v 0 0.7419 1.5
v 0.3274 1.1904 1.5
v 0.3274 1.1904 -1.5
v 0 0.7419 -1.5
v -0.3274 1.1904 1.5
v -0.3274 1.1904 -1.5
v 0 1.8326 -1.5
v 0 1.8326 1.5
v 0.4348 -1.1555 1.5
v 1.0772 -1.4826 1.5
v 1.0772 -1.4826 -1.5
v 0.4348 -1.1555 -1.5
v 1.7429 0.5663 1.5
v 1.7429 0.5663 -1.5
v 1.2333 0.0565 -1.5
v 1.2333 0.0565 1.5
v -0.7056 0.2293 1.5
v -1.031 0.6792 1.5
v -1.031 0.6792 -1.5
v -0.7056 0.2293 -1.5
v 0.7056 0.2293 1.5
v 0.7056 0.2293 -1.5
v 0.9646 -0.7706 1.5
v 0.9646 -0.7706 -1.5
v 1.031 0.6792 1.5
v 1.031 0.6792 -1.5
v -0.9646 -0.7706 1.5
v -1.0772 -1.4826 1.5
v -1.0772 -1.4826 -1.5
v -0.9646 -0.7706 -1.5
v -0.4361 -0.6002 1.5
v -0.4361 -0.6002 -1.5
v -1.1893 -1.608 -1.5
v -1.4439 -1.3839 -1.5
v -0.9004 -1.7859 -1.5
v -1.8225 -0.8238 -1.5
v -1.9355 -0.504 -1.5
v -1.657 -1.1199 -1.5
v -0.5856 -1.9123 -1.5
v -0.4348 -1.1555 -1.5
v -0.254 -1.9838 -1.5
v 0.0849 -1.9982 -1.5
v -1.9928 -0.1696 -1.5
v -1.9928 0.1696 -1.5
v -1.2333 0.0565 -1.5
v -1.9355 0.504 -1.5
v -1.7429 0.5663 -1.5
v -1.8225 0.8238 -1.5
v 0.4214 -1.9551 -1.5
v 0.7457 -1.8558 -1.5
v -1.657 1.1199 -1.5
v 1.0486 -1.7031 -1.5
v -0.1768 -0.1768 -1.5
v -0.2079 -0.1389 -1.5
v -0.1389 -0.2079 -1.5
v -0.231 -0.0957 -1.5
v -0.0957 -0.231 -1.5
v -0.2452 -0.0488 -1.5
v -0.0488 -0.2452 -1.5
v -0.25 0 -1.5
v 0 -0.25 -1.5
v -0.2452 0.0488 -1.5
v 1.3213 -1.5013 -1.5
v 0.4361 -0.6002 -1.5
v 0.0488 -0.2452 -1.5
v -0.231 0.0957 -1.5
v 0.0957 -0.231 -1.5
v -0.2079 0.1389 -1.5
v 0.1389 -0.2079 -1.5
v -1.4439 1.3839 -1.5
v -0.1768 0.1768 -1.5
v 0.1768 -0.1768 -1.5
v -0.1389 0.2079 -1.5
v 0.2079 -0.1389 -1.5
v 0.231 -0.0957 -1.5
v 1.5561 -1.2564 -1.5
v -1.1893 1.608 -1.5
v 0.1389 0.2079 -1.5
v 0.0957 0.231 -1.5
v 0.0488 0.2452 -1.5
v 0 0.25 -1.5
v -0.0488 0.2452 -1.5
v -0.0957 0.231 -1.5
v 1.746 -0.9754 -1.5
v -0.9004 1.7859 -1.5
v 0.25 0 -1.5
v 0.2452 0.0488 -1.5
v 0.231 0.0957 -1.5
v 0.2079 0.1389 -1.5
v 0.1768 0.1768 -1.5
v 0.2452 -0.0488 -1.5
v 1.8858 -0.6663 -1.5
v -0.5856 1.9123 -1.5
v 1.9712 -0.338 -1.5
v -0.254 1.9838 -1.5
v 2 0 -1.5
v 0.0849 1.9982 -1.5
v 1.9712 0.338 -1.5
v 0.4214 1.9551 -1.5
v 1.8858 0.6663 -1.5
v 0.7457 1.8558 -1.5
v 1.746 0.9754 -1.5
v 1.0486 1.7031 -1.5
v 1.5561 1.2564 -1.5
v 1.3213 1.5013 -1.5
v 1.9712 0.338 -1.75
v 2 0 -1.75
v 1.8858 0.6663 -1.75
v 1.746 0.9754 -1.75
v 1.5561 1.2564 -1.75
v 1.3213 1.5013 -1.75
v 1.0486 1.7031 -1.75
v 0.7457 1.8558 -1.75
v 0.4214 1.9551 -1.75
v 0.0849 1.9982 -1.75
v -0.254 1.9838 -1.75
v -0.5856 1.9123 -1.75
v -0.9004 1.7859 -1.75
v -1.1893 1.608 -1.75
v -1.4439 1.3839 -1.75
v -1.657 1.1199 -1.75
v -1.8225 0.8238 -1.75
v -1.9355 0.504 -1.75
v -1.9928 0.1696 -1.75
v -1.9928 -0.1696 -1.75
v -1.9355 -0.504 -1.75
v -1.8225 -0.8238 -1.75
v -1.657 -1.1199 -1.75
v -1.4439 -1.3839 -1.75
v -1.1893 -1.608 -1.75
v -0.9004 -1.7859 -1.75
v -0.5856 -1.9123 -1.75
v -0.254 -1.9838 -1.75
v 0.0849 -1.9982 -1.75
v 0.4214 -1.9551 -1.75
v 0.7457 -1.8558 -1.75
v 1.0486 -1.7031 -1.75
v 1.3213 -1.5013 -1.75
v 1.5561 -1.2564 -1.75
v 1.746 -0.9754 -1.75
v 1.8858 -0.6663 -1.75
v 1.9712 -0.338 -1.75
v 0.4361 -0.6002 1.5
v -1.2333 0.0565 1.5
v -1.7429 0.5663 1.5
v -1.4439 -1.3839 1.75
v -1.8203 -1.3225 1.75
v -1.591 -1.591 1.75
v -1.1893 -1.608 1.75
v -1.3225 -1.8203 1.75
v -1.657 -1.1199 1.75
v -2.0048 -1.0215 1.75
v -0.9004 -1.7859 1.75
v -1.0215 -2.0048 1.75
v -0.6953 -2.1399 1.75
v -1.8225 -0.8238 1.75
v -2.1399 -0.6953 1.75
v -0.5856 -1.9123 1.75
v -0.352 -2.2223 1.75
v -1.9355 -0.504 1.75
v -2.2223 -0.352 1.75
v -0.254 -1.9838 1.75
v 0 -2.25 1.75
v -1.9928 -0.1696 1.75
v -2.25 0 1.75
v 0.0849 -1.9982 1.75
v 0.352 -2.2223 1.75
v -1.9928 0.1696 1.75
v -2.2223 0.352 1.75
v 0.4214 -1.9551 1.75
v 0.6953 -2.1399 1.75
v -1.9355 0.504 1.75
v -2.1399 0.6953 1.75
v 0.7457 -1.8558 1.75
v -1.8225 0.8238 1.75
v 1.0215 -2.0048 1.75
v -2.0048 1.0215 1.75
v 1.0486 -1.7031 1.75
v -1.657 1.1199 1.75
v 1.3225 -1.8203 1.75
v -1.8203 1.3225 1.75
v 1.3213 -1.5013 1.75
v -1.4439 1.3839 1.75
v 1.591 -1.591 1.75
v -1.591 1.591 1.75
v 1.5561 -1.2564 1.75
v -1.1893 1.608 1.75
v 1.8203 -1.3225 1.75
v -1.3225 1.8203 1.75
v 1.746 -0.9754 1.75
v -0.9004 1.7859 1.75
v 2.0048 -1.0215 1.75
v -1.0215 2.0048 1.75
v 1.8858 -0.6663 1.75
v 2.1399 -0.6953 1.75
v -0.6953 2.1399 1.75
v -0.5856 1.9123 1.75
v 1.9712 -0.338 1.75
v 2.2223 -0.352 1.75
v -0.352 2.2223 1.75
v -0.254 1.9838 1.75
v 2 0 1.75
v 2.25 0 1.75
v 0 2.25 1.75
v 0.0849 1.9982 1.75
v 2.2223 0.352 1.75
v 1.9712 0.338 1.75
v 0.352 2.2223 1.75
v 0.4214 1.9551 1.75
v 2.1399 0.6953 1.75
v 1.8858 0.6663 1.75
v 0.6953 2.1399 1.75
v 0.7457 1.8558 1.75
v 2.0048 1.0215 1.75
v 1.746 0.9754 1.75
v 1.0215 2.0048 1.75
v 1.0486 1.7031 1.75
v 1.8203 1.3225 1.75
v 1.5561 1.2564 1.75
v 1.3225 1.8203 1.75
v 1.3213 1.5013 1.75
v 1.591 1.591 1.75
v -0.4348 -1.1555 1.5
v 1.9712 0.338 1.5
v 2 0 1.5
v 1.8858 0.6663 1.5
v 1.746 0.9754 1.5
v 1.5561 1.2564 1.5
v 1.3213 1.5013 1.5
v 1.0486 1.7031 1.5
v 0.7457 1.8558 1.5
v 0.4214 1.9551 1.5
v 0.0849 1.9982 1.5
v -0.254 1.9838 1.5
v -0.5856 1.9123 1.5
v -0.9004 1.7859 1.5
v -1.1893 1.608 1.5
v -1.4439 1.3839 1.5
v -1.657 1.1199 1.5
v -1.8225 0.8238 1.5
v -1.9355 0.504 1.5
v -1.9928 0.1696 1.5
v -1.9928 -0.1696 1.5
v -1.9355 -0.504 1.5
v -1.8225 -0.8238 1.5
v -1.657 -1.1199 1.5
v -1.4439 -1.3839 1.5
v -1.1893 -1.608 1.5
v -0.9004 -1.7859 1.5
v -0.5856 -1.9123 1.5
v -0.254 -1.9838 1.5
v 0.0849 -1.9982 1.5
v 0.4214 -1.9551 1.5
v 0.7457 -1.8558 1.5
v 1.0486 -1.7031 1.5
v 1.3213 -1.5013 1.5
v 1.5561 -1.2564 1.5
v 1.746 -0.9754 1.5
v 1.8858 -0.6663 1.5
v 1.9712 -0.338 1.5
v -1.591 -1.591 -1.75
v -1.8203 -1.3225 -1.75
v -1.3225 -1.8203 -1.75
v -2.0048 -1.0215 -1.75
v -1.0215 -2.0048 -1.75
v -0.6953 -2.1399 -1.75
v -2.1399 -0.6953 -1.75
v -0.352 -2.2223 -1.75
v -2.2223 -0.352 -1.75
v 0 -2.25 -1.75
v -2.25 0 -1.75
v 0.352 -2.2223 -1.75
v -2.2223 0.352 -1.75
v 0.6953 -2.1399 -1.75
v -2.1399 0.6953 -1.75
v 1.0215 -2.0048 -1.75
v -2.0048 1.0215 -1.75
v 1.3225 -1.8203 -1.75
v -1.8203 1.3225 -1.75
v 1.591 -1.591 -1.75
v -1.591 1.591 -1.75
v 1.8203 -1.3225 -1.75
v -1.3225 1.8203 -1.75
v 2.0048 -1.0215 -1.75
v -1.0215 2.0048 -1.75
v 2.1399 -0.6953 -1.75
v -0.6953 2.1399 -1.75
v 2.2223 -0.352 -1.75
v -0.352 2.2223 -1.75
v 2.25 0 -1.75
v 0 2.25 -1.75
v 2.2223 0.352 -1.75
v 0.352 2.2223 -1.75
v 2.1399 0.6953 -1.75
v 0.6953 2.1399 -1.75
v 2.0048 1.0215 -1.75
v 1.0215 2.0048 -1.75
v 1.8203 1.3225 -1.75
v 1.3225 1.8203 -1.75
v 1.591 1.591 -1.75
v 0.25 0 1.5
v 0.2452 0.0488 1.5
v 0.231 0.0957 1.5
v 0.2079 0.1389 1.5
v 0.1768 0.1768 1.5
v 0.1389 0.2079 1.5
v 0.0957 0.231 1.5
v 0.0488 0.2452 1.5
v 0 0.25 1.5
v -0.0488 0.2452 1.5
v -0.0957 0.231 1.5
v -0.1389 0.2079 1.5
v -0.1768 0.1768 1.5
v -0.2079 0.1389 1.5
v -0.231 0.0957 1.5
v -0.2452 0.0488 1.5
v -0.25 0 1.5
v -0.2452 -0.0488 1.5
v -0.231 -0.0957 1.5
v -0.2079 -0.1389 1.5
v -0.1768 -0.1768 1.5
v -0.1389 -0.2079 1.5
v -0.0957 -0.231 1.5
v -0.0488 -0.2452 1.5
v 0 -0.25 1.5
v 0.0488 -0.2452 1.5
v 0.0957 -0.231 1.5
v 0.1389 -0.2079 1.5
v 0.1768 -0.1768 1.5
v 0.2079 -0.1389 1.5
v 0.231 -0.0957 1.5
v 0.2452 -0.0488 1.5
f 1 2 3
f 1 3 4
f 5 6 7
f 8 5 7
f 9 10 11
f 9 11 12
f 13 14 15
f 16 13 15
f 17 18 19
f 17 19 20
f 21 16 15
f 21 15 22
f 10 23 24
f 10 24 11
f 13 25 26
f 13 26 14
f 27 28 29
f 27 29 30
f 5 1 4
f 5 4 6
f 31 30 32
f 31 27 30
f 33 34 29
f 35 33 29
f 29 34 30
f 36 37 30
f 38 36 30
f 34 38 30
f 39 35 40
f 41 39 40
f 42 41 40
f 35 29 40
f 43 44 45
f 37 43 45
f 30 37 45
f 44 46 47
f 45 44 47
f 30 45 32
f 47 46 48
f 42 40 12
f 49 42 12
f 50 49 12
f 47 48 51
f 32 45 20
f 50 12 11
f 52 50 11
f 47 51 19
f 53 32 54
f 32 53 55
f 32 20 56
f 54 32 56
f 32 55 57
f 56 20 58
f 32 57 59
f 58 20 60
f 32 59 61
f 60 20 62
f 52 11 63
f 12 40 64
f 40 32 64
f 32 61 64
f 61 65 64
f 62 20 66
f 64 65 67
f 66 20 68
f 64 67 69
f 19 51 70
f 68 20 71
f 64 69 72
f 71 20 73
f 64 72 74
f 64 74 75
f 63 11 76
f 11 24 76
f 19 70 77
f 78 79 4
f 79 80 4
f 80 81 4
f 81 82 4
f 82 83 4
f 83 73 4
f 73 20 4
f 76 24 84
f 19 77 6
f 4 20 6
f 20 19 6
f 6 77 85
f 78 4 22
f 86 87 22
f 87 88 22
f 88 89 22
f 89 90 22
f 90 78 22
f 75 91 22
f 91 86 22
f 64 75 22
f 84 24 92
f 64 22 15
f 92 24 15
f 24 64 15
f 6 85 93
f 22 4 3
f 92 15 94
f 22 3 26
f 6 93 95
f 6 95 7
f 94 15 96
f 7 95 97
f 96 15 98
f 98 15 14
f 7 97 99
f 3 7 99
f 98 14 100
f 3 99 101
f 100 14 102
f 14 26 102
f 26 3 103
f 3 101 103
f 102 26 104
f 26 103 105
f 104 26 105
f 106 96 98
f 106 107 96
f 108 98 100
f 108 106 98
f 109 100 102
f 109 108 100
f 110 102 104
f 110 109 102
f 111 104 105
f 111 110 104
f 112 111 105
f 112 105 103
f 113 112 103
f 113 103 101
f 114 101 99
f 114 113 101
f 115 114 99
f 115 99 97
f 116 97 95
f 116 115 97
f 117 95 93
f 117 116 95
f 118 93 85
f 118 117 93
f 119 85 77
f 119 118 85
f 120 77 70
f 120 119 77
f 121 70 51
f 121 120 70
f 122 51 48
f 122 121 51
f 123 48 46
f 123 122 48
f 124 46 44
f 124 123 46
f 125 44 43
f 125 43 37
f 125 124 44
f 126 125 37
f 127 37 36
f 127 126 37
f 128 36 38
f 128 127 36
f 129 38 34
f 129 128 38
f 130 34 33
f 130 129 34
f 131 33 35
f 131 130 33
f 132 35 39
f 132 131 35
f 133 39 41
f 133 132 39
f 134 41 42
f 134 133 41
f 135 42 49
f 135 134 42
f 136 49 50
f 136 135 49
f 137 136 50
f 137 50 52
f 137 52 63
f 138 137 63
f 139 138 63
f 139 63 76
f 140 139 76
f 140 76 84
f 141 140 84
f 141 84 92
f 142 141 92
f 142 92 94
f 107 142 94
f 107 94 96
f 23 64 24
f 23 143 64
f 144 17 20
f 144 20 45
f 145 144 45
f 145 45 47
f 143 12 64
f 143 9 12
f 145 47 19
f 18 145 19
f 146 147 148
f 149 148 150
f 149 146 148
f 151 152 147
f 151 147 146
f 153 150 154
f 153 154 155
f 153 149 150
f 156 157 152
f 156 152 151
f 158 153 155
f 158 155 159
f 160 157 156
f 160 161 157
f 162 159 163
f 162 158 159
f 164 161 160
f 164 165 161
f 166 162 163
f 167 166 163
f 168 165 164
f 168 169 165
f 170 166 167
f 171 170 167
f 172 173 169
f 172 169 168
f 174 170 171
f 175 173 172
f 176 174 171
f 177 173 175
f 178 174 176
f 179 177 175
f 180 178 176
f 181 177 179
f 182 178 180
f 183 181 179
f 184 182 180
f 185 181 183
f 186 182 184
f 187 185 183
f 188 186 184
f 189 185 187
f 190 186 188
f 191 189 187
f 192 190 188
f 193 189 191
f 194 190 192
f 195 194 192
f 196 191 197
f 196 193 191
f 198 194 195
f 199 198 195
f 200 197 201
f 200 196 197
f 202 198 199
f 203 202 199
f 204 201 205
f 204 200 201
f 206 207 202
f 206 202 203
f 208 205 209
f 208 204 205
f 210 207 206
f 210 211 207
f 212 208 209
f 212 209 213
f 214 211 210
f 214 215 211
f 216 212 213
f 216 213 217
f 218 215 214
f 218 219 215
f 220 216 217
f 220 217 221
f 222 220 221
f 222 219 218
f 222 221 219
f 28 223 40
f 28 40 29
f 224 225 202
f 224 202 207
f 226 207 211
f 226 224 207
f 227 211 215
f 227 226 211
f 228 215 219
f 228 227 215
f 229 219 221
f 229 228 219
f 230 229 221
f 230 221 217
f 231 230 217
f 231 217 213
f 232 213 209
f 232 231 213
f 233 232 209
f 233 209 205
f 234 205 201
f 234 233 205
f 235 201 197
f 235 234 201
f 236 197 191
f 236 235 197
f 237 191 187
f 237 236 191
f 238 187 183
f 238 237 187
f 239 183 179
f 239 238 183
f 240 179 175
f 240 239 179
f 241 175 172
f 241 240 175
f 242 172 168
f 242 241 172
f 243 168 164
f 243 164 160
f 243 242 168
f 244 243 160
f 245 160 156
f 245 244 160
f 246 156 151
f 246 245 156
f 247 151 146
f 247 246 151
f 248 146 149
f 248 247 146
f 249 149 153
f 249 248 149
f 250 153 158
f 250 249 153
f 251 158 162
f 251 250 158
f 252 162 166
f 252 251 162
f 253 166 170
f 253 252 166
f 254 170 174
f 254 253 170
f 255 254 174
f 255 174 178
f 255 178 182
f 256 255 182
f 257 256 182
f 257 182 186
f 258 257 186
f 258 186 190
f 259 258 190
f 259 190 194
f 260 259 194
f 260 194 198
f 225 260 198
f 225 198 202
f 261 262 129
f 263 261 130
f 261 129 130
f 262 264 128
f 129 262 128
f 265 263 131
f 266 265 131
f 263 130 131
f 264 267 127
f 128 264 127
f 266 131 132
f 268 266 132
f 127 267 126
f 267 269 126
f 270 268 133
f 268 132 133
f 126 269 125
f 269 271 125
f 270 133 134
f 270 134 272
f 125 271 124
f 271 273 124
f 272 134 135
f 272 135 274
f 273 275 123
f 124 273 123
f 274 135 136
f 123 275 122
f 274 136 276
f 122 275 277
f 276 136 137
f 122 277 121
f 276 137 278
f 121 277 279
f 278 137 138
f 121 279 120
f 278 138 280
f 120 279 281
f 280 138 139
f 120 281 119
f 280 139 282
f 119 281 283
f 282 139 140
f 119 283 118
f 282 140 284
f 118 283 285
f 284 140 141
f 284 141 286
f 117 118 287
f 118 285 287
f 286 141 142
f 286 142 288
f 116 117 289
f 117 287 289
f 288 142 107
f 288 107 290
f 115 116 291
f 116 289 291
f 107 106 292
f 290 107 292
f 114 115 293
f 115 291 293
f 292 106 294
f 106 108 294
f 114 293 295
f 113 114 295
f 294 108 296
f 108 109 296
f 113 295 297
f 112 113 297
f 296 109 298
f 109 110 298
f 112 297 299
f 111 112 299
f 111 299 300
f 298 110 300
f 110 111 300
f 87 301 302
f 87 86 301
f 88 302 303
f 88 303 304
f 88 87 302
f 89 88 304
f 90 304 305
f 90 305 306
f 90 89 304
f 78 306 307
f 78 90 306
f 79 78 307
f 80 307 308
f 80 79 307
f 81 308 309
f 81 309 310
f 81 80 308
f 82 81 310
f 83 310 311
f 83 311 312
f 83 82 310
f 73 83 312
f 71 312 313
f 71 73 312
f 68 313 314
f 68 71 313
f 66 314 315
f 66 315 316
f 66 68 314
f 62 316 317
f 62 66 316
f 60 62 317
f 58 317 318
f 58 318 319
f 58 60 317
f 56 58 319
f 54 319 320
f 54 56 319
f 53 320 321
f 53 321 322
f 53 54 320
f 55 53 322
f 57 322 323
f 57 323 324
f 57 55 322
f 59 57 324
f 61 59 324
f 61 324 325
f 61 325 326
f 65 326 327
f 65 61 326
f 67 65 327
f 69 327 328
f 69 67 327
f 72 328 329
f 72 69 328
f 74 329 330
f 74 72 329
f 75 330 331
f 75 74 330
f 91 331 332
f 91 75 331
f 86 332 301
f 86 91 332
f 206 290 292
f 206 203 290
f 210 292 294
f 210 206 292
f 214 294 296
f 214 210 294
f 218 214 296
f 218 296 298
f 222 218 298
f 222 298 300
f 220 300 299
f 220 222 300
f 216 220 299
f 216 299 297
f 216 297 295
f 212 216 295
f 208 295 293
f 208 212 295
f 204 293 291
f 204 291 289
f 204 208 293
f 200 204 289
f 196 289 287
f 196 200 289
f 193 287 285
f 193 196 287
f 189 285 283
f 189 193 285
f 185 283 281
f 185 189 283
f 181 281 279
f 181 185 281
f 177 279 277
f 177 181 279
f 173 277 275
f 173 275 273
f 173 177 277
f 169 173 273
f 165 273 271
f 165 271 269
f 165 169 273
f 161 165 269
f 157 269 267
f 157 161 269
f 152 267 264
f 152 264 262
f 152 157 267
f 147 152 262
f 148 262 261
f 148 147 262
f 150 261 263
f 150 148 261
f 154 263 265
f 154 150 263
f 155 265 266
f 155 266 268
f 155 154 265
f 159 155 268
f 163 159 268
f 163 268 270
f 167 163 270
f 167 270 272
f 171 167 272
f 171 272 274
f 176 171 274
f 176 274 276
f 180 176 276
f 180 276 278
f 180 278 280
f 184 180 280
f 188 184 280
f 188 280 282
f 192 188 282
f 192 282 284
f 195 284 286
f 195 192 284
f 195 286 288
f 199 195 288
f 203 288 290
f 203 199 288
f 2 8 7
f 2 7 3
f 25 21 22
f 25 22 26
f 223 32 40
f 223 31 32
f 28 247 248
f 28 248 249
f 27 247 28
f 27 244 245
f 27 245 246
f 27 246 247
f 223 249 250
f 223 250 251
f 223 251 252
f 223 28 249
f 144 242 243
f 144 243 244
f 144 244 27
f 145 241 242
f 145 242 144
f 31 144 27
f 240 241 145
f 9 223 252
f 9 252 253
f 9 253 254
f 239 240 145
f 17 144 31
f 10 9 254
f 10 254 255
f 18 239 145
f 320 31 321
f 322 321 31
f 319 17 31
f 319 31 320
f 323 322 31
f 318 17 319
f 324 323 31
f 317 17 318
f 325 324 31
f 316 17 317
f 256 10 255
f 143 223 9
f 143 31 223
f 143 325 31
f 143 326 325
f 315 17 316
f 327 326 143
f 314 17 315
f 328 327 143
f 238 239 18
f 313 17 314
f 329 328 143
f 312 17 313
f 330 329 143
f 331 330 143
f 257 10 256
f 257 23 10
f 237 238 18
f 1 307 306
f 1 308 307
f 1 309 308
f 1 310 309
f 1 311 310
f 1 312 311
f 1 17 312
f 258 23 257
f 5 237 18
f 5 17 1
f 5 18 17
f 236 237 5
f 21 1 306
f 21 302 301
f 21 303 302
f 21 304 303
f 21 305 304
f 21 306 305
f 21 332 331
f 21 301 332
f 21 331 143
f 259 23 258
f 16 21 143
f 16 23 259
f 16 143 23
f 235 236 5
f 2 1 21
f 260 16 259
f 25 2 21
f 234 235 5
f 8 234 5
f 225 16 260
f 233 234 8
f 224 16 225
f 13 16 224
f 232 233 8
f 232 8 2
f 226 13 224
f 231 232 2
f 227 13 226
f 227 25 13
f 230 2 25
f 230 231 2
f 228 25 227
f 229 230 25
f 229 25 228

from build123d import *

# Parameters (mm, degrees)
F0_R     = 2
F0_R_2   = 0.25
F1_DEPTH = 1.5
F0_R_3   = 2.25
F2_DEPTH = 1.75


with BuildPart() as f1:
    # F0 (on Top) → F1 (new body, symmetric)
    with BuildSketch(Plane.XY):
        Circle(F0_R)
        Polygon((-0.43483, -1.155508), (-1.077198, -1.482635), (-0.964584, -0.77062), (-0.436063, -0.600189), align=None, mode=Mode.SUBTRACT)
        Polygon((0.964584, -0.77062), (1.077198, -1.482635), (0.43483, -1.155508), (0.436063, -0.600189), align=None, mode=Mode.SUBTRACT)
        Polygon((-1.233324, 0.056476), (-1.742942, 0.566316), (-1.030976, 0.679239), (-0.705564, 0.229252), align=None, mode=Mode.SUBTRACT)
        Circle(F0_R_2, mode=Mode.SUBTRACT)
        Polygon((1.030976, 0.679239), (1.742942, 0.566316), (1.233324, 0.056476), (0.705564, 0.229252), align=None, mode=Mode.SUBTRACT)
        Polygon((-0.327406, 1.190413), (0, 1.832638), (0.327406, 1.190413), (0, 0.741874), align=None, mode=Mode.SUBTRACT)
    extrude(amount=F1_DEPTH, both=True)

    # F0 (on Top) → F2 (join, symmetric)
    with BuildSketch(Plane.XY):
        Circle(F0_R_3)
        Circle(F0_R, mode=Mode.SUBTRACT)
    extrude(amount=F2_DEPTH, both=True)


solid = f1.part
